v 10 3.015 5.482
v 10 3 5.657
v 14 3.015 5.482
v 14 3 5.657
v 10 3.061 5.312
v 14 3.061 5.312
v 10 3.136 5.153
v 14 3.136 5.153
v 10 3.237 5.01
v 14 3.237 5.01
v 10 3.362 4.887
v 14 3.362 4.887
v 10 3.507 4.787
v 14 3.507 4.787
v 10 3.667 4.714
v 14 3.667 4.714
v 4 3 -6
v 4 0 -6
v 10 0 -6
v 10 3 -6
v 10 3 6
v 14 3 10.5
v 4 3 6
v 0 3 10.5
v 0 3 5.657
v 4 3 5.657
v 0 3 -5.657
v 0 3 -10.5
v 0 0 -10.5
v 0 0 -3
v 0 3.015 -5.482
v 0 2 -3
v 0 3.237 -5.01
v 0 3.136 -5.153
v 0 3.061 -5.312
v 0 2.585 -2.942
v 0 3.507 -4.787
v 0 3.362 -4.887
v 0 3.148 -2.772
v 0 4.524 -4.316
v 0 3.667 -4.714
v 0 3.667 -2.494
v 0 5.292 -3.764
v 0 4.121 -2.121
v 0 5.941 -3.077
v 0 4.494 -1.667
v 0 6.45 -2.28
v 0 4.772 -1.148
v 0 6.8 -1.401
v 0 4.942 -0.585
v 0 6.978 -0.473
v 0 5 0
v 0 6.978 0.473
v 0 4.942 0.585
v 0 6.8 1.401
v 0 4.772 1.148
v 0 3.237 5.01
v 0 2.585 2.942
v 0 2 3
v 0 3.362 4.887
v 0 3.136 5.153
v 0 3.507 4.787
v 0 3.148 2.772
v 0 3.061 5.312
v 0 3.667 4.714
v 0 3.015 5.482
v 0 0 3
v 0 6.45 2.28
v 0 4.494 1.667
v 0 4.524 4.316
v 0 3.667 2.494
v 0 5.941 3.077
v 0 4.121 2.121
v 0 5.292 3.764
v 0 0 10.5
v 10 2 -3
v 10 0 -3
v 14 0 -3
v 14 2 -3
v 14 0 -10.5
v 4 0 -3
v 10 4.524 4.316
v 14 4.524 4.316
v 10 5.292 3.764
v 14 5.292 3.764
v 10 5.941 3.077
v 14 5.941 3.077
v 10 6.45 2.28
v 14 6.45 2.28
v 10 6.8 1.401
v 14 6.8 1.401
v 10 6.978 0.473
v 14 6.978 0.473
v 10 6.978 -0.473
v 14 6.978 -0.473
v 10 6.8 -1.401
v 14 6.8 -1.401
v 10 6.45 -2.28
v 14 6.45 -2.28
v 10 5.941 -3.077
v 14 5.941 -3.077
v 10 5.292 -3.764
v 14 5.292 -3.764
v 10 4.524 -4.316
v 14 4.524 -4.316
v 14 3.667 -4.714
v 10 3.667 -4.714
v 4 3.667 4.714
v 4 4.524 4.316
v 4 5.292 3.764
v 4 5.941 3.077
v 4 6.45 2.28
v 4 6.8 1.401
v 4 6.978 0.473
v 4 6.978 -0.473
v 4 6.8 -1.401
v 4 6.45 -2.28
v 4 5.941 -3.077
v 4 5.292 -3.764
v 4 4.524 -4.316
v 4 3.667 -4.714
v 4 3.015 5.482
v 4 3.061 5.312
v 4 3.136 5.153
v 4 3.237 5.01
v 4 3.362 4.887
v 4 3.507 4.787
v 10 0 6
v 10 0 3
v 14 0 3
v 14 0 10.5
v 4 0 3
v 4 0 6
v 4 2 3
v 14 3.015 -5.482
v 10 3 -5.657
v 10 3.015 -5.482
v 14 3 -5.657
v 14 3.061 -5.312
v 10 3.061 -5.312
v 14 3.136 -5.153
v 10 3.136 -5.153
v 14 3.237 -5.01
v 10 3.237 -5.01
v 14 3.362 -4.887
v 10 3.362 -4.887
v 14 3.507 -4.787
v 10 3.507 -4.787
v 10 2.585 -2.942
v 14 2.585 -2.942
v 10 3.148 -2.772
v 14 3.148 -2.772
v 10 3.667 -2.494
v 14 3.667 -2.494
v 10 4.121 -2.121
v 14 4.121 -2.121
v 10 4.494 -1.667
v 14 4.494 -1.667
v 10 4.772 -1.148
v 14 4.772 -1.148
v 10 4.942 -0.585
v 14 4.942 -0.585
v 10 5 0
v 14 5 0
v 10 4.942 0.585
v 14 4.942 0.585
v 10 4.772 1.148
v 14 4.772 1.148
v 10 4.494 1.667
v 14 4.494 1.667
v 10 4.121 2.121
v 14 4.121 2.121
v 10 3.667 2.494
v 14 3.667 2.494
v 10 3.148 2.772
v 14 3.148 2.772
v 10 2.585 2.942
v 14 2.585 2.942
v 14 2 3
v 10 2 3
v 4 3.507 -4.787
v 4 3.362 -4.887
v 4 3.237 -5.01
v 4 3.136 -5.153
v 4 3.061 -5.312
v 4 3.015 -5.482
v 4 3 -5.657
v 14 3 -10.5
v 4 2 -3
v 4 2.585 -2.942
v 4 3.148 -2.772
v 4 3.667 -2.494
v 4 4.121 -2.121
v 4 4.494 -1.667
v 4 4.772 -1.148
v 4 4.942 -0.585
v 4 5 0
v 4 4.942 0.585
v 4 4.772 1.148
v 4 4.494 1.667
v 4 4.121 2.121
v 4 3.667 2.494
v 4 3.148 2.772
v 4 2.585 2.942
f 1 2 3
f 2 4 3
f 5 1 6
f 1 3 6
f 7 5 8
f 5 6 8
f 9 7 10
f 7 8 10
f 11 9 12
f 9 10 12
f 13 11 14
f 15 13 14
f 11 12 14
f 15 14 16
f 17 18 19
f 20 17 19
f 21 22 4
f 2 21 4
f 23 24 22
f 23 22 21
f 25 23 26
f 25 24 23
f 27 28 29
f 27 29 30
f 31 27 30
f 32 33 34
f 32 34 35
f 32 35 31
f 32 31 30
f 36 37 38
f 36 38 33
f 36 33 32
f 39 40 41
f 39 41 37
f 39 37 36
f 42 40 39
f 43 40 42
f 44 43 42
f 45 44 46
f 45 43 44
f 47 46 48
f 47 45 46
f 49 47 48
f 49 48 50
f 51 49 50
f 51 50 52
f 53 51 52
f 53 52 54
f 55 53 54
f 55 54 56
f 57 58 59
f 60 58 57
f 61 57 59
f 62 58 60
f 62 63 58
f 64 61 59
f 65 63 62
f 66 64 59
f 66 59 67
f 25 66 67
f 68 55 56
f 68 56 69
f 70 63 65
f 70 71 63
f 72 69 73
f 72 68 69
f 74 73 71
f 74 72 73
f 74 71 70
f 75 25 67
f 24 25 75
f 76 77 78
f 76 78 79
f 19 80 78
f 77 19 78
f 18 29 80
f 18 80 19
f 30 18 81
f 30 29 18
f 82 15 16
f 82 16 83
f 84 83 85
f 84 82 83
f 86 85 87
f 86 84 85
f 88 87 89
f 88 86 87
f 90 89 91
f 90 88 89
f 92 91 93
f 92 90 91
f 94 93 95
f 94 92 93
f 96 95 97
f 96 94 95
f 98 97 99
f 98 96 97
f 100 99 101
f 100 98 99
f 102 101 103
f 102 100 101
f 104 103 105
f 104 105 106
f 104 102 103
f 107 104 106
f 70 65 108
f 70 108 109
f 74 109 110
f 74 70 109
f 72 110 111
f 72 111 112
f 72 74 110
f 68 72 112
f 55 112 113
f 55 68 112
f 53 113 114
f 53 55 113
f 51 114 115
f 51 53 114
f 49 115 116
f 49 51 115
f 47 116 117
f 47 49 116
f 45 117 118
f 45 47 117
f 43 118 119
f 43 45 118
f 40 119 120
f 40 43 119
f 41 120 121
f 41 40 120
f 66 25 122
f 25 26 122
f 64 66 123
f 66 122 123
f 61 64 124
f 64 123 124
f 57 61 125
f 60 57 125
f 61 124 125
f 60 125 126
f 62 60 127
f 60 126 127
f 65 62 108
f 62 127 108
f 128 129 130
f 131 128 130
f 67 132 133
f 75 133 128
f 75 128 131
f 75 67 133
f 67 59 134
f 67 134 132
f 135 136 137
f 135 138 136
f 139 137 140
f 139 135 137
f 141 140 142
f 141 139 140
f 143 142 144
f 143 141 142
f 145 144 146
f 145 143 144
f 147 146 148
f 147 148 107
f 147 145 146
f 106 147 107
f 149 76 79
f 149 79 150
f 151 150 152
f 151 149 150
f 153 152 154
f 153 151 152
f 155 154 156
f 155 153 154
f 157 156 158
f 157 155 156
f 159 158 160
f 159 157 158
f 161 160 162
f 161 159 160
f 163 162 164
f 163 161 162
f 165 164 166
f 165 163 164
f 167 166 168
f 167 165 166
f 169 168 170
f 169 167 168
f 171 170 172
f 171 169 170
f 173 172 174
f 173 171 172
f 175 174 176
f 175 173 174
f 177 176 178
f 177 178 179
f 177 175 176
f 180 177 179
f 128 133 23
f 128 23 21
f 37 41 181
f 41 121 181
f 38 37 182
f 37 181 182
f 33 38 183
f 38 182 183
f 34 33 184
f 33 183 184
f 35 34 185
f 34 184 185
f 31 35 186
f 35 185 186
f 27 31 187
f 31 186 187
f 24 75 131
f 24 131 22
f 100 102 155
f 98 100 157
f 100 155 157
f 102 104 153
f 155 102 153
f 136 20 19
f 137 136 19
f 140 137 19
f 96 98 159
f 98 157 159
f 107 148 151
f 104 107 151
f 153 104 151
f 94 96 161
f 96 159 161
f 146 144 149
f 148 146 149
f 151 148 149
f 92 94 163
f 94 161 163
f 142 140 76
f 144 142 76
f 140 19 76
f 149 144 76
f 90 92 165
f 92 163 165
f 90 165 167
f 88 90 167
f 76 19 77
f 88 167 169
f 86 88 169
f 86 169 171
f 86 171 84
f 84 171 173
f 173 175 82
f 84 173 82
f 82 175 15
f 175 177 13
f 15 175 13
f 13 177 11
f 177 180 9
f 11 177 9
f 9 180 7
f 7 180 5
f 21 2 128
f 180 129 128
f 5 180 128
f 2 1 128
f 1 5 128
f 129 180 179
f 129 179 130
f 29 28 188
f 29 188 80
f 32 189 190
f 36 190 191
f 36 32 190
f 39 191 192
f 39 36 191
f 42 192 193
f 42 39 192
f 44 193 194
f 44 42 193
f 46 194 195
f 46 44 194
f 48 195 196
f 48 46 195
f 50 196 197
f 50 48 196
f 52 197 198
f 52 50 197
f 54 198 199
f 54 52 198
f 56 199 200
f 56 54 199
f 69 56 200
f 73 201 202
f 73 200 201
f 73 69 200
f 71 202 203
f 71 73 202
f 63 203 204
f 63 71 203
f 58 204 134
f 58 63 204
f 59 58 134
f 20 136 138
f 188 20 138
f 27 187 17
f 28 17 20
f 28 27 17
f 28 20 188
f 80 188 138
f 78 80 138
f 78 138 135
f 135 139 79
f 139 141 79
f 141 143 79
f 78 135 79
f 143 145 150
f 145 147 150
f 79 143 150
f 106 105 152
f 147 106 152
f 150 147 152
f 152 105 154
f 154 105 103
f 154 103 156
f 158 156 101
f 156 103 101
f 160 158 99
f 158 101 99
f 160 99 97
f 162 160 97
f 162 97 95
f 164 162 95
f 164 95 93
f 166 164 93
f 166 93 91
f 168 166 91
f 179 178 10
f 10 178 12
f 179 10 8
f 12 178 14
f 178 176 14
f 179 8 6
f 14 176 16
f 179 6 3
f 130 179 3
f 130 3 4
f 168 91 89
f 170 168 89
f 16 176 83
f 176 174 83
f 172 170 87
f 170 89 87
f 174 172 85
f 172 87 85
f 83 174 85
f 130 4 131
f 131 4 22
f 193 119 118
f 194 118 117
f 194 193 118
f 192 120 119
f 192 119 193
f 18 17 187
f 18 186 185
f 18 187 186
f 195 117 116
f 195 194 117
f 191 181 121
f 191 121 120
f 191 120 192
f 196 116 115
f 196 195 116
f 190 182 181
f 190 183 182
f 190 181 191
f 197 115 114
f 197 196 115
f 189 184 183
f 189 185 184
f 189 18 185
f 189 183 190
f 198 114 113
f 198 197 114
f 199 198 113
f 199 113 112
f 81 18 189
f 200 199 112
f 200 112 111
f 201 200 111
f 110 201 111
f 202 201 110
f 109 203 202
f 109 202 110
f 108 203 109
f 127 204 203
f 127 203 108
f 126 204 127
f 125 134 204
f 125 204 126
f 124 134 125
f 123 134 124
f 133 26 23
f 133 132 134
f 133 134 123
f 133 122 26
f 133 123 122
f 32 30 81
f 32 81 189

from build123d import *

# Parameters (mm, degrees)
EXTRUDE_1_DEPTH     = 14
SKETCH_3_W          = 6
SKETCH_3_H          = 12
CUT_EXTRUDE_1_DEPTH = 19.848076825
FILLET_2_R          = 1


with BuildPart() as part:
    # 草图2 → 凸台-拉伸1 (new body)
    with BuildSketch(Plane(origin=(0, 0, 0), x_dir=(0, 0, -1), z_dir=(1, 0, 0))):
        with BuildLine():
            Line((10.5, 0), (3, 0))
            Line((3, 0), (3, 2))
            ThreePointArc((3, 2), (0, 5), (-3, 2))
            Line((-3, 2), (-3, 0))
            Line((-3, 0), (-10.5, 0))
            Line((-10.5, 0), (-10.5, 3))
            Line((-10.5, 3), (-4.898979486, 3))
            ThreePointArc((-4.898979486, 3), (0, 7), (4.898979486, 3))
            Line((4.898979486, 3), (10.5, 3))
            Line((10.5, 3), (10.5, 0))
        make_face()
    extrude(amount=EXTRUDE_1_DEPTH)

    # 草图3 → 切除-拉伸1 (cut, through all)
    with BuildSketch(Plane.XZ):
        with Locations((7, 0)):
            Rectangle(SKETCH_3_W, SKETCH_3_H)
    extrude(amount=-CUT_EXTRUDE_1_DEPTH, mode=Mode.SUBTRACT)

    # 圆角2
    fillet_2_edges = [part.edges().sort_by_distance(p)[0] for p in [
        (12, 3, 4.898979486),
        (12, 3, -4.898979486),
        (2, 3, 4.898979486),
        (2, 3, -4.898979486),
    ]]
    fillet(fillet_2_edges, radius=FILLET_2_R)


solid = part.part
